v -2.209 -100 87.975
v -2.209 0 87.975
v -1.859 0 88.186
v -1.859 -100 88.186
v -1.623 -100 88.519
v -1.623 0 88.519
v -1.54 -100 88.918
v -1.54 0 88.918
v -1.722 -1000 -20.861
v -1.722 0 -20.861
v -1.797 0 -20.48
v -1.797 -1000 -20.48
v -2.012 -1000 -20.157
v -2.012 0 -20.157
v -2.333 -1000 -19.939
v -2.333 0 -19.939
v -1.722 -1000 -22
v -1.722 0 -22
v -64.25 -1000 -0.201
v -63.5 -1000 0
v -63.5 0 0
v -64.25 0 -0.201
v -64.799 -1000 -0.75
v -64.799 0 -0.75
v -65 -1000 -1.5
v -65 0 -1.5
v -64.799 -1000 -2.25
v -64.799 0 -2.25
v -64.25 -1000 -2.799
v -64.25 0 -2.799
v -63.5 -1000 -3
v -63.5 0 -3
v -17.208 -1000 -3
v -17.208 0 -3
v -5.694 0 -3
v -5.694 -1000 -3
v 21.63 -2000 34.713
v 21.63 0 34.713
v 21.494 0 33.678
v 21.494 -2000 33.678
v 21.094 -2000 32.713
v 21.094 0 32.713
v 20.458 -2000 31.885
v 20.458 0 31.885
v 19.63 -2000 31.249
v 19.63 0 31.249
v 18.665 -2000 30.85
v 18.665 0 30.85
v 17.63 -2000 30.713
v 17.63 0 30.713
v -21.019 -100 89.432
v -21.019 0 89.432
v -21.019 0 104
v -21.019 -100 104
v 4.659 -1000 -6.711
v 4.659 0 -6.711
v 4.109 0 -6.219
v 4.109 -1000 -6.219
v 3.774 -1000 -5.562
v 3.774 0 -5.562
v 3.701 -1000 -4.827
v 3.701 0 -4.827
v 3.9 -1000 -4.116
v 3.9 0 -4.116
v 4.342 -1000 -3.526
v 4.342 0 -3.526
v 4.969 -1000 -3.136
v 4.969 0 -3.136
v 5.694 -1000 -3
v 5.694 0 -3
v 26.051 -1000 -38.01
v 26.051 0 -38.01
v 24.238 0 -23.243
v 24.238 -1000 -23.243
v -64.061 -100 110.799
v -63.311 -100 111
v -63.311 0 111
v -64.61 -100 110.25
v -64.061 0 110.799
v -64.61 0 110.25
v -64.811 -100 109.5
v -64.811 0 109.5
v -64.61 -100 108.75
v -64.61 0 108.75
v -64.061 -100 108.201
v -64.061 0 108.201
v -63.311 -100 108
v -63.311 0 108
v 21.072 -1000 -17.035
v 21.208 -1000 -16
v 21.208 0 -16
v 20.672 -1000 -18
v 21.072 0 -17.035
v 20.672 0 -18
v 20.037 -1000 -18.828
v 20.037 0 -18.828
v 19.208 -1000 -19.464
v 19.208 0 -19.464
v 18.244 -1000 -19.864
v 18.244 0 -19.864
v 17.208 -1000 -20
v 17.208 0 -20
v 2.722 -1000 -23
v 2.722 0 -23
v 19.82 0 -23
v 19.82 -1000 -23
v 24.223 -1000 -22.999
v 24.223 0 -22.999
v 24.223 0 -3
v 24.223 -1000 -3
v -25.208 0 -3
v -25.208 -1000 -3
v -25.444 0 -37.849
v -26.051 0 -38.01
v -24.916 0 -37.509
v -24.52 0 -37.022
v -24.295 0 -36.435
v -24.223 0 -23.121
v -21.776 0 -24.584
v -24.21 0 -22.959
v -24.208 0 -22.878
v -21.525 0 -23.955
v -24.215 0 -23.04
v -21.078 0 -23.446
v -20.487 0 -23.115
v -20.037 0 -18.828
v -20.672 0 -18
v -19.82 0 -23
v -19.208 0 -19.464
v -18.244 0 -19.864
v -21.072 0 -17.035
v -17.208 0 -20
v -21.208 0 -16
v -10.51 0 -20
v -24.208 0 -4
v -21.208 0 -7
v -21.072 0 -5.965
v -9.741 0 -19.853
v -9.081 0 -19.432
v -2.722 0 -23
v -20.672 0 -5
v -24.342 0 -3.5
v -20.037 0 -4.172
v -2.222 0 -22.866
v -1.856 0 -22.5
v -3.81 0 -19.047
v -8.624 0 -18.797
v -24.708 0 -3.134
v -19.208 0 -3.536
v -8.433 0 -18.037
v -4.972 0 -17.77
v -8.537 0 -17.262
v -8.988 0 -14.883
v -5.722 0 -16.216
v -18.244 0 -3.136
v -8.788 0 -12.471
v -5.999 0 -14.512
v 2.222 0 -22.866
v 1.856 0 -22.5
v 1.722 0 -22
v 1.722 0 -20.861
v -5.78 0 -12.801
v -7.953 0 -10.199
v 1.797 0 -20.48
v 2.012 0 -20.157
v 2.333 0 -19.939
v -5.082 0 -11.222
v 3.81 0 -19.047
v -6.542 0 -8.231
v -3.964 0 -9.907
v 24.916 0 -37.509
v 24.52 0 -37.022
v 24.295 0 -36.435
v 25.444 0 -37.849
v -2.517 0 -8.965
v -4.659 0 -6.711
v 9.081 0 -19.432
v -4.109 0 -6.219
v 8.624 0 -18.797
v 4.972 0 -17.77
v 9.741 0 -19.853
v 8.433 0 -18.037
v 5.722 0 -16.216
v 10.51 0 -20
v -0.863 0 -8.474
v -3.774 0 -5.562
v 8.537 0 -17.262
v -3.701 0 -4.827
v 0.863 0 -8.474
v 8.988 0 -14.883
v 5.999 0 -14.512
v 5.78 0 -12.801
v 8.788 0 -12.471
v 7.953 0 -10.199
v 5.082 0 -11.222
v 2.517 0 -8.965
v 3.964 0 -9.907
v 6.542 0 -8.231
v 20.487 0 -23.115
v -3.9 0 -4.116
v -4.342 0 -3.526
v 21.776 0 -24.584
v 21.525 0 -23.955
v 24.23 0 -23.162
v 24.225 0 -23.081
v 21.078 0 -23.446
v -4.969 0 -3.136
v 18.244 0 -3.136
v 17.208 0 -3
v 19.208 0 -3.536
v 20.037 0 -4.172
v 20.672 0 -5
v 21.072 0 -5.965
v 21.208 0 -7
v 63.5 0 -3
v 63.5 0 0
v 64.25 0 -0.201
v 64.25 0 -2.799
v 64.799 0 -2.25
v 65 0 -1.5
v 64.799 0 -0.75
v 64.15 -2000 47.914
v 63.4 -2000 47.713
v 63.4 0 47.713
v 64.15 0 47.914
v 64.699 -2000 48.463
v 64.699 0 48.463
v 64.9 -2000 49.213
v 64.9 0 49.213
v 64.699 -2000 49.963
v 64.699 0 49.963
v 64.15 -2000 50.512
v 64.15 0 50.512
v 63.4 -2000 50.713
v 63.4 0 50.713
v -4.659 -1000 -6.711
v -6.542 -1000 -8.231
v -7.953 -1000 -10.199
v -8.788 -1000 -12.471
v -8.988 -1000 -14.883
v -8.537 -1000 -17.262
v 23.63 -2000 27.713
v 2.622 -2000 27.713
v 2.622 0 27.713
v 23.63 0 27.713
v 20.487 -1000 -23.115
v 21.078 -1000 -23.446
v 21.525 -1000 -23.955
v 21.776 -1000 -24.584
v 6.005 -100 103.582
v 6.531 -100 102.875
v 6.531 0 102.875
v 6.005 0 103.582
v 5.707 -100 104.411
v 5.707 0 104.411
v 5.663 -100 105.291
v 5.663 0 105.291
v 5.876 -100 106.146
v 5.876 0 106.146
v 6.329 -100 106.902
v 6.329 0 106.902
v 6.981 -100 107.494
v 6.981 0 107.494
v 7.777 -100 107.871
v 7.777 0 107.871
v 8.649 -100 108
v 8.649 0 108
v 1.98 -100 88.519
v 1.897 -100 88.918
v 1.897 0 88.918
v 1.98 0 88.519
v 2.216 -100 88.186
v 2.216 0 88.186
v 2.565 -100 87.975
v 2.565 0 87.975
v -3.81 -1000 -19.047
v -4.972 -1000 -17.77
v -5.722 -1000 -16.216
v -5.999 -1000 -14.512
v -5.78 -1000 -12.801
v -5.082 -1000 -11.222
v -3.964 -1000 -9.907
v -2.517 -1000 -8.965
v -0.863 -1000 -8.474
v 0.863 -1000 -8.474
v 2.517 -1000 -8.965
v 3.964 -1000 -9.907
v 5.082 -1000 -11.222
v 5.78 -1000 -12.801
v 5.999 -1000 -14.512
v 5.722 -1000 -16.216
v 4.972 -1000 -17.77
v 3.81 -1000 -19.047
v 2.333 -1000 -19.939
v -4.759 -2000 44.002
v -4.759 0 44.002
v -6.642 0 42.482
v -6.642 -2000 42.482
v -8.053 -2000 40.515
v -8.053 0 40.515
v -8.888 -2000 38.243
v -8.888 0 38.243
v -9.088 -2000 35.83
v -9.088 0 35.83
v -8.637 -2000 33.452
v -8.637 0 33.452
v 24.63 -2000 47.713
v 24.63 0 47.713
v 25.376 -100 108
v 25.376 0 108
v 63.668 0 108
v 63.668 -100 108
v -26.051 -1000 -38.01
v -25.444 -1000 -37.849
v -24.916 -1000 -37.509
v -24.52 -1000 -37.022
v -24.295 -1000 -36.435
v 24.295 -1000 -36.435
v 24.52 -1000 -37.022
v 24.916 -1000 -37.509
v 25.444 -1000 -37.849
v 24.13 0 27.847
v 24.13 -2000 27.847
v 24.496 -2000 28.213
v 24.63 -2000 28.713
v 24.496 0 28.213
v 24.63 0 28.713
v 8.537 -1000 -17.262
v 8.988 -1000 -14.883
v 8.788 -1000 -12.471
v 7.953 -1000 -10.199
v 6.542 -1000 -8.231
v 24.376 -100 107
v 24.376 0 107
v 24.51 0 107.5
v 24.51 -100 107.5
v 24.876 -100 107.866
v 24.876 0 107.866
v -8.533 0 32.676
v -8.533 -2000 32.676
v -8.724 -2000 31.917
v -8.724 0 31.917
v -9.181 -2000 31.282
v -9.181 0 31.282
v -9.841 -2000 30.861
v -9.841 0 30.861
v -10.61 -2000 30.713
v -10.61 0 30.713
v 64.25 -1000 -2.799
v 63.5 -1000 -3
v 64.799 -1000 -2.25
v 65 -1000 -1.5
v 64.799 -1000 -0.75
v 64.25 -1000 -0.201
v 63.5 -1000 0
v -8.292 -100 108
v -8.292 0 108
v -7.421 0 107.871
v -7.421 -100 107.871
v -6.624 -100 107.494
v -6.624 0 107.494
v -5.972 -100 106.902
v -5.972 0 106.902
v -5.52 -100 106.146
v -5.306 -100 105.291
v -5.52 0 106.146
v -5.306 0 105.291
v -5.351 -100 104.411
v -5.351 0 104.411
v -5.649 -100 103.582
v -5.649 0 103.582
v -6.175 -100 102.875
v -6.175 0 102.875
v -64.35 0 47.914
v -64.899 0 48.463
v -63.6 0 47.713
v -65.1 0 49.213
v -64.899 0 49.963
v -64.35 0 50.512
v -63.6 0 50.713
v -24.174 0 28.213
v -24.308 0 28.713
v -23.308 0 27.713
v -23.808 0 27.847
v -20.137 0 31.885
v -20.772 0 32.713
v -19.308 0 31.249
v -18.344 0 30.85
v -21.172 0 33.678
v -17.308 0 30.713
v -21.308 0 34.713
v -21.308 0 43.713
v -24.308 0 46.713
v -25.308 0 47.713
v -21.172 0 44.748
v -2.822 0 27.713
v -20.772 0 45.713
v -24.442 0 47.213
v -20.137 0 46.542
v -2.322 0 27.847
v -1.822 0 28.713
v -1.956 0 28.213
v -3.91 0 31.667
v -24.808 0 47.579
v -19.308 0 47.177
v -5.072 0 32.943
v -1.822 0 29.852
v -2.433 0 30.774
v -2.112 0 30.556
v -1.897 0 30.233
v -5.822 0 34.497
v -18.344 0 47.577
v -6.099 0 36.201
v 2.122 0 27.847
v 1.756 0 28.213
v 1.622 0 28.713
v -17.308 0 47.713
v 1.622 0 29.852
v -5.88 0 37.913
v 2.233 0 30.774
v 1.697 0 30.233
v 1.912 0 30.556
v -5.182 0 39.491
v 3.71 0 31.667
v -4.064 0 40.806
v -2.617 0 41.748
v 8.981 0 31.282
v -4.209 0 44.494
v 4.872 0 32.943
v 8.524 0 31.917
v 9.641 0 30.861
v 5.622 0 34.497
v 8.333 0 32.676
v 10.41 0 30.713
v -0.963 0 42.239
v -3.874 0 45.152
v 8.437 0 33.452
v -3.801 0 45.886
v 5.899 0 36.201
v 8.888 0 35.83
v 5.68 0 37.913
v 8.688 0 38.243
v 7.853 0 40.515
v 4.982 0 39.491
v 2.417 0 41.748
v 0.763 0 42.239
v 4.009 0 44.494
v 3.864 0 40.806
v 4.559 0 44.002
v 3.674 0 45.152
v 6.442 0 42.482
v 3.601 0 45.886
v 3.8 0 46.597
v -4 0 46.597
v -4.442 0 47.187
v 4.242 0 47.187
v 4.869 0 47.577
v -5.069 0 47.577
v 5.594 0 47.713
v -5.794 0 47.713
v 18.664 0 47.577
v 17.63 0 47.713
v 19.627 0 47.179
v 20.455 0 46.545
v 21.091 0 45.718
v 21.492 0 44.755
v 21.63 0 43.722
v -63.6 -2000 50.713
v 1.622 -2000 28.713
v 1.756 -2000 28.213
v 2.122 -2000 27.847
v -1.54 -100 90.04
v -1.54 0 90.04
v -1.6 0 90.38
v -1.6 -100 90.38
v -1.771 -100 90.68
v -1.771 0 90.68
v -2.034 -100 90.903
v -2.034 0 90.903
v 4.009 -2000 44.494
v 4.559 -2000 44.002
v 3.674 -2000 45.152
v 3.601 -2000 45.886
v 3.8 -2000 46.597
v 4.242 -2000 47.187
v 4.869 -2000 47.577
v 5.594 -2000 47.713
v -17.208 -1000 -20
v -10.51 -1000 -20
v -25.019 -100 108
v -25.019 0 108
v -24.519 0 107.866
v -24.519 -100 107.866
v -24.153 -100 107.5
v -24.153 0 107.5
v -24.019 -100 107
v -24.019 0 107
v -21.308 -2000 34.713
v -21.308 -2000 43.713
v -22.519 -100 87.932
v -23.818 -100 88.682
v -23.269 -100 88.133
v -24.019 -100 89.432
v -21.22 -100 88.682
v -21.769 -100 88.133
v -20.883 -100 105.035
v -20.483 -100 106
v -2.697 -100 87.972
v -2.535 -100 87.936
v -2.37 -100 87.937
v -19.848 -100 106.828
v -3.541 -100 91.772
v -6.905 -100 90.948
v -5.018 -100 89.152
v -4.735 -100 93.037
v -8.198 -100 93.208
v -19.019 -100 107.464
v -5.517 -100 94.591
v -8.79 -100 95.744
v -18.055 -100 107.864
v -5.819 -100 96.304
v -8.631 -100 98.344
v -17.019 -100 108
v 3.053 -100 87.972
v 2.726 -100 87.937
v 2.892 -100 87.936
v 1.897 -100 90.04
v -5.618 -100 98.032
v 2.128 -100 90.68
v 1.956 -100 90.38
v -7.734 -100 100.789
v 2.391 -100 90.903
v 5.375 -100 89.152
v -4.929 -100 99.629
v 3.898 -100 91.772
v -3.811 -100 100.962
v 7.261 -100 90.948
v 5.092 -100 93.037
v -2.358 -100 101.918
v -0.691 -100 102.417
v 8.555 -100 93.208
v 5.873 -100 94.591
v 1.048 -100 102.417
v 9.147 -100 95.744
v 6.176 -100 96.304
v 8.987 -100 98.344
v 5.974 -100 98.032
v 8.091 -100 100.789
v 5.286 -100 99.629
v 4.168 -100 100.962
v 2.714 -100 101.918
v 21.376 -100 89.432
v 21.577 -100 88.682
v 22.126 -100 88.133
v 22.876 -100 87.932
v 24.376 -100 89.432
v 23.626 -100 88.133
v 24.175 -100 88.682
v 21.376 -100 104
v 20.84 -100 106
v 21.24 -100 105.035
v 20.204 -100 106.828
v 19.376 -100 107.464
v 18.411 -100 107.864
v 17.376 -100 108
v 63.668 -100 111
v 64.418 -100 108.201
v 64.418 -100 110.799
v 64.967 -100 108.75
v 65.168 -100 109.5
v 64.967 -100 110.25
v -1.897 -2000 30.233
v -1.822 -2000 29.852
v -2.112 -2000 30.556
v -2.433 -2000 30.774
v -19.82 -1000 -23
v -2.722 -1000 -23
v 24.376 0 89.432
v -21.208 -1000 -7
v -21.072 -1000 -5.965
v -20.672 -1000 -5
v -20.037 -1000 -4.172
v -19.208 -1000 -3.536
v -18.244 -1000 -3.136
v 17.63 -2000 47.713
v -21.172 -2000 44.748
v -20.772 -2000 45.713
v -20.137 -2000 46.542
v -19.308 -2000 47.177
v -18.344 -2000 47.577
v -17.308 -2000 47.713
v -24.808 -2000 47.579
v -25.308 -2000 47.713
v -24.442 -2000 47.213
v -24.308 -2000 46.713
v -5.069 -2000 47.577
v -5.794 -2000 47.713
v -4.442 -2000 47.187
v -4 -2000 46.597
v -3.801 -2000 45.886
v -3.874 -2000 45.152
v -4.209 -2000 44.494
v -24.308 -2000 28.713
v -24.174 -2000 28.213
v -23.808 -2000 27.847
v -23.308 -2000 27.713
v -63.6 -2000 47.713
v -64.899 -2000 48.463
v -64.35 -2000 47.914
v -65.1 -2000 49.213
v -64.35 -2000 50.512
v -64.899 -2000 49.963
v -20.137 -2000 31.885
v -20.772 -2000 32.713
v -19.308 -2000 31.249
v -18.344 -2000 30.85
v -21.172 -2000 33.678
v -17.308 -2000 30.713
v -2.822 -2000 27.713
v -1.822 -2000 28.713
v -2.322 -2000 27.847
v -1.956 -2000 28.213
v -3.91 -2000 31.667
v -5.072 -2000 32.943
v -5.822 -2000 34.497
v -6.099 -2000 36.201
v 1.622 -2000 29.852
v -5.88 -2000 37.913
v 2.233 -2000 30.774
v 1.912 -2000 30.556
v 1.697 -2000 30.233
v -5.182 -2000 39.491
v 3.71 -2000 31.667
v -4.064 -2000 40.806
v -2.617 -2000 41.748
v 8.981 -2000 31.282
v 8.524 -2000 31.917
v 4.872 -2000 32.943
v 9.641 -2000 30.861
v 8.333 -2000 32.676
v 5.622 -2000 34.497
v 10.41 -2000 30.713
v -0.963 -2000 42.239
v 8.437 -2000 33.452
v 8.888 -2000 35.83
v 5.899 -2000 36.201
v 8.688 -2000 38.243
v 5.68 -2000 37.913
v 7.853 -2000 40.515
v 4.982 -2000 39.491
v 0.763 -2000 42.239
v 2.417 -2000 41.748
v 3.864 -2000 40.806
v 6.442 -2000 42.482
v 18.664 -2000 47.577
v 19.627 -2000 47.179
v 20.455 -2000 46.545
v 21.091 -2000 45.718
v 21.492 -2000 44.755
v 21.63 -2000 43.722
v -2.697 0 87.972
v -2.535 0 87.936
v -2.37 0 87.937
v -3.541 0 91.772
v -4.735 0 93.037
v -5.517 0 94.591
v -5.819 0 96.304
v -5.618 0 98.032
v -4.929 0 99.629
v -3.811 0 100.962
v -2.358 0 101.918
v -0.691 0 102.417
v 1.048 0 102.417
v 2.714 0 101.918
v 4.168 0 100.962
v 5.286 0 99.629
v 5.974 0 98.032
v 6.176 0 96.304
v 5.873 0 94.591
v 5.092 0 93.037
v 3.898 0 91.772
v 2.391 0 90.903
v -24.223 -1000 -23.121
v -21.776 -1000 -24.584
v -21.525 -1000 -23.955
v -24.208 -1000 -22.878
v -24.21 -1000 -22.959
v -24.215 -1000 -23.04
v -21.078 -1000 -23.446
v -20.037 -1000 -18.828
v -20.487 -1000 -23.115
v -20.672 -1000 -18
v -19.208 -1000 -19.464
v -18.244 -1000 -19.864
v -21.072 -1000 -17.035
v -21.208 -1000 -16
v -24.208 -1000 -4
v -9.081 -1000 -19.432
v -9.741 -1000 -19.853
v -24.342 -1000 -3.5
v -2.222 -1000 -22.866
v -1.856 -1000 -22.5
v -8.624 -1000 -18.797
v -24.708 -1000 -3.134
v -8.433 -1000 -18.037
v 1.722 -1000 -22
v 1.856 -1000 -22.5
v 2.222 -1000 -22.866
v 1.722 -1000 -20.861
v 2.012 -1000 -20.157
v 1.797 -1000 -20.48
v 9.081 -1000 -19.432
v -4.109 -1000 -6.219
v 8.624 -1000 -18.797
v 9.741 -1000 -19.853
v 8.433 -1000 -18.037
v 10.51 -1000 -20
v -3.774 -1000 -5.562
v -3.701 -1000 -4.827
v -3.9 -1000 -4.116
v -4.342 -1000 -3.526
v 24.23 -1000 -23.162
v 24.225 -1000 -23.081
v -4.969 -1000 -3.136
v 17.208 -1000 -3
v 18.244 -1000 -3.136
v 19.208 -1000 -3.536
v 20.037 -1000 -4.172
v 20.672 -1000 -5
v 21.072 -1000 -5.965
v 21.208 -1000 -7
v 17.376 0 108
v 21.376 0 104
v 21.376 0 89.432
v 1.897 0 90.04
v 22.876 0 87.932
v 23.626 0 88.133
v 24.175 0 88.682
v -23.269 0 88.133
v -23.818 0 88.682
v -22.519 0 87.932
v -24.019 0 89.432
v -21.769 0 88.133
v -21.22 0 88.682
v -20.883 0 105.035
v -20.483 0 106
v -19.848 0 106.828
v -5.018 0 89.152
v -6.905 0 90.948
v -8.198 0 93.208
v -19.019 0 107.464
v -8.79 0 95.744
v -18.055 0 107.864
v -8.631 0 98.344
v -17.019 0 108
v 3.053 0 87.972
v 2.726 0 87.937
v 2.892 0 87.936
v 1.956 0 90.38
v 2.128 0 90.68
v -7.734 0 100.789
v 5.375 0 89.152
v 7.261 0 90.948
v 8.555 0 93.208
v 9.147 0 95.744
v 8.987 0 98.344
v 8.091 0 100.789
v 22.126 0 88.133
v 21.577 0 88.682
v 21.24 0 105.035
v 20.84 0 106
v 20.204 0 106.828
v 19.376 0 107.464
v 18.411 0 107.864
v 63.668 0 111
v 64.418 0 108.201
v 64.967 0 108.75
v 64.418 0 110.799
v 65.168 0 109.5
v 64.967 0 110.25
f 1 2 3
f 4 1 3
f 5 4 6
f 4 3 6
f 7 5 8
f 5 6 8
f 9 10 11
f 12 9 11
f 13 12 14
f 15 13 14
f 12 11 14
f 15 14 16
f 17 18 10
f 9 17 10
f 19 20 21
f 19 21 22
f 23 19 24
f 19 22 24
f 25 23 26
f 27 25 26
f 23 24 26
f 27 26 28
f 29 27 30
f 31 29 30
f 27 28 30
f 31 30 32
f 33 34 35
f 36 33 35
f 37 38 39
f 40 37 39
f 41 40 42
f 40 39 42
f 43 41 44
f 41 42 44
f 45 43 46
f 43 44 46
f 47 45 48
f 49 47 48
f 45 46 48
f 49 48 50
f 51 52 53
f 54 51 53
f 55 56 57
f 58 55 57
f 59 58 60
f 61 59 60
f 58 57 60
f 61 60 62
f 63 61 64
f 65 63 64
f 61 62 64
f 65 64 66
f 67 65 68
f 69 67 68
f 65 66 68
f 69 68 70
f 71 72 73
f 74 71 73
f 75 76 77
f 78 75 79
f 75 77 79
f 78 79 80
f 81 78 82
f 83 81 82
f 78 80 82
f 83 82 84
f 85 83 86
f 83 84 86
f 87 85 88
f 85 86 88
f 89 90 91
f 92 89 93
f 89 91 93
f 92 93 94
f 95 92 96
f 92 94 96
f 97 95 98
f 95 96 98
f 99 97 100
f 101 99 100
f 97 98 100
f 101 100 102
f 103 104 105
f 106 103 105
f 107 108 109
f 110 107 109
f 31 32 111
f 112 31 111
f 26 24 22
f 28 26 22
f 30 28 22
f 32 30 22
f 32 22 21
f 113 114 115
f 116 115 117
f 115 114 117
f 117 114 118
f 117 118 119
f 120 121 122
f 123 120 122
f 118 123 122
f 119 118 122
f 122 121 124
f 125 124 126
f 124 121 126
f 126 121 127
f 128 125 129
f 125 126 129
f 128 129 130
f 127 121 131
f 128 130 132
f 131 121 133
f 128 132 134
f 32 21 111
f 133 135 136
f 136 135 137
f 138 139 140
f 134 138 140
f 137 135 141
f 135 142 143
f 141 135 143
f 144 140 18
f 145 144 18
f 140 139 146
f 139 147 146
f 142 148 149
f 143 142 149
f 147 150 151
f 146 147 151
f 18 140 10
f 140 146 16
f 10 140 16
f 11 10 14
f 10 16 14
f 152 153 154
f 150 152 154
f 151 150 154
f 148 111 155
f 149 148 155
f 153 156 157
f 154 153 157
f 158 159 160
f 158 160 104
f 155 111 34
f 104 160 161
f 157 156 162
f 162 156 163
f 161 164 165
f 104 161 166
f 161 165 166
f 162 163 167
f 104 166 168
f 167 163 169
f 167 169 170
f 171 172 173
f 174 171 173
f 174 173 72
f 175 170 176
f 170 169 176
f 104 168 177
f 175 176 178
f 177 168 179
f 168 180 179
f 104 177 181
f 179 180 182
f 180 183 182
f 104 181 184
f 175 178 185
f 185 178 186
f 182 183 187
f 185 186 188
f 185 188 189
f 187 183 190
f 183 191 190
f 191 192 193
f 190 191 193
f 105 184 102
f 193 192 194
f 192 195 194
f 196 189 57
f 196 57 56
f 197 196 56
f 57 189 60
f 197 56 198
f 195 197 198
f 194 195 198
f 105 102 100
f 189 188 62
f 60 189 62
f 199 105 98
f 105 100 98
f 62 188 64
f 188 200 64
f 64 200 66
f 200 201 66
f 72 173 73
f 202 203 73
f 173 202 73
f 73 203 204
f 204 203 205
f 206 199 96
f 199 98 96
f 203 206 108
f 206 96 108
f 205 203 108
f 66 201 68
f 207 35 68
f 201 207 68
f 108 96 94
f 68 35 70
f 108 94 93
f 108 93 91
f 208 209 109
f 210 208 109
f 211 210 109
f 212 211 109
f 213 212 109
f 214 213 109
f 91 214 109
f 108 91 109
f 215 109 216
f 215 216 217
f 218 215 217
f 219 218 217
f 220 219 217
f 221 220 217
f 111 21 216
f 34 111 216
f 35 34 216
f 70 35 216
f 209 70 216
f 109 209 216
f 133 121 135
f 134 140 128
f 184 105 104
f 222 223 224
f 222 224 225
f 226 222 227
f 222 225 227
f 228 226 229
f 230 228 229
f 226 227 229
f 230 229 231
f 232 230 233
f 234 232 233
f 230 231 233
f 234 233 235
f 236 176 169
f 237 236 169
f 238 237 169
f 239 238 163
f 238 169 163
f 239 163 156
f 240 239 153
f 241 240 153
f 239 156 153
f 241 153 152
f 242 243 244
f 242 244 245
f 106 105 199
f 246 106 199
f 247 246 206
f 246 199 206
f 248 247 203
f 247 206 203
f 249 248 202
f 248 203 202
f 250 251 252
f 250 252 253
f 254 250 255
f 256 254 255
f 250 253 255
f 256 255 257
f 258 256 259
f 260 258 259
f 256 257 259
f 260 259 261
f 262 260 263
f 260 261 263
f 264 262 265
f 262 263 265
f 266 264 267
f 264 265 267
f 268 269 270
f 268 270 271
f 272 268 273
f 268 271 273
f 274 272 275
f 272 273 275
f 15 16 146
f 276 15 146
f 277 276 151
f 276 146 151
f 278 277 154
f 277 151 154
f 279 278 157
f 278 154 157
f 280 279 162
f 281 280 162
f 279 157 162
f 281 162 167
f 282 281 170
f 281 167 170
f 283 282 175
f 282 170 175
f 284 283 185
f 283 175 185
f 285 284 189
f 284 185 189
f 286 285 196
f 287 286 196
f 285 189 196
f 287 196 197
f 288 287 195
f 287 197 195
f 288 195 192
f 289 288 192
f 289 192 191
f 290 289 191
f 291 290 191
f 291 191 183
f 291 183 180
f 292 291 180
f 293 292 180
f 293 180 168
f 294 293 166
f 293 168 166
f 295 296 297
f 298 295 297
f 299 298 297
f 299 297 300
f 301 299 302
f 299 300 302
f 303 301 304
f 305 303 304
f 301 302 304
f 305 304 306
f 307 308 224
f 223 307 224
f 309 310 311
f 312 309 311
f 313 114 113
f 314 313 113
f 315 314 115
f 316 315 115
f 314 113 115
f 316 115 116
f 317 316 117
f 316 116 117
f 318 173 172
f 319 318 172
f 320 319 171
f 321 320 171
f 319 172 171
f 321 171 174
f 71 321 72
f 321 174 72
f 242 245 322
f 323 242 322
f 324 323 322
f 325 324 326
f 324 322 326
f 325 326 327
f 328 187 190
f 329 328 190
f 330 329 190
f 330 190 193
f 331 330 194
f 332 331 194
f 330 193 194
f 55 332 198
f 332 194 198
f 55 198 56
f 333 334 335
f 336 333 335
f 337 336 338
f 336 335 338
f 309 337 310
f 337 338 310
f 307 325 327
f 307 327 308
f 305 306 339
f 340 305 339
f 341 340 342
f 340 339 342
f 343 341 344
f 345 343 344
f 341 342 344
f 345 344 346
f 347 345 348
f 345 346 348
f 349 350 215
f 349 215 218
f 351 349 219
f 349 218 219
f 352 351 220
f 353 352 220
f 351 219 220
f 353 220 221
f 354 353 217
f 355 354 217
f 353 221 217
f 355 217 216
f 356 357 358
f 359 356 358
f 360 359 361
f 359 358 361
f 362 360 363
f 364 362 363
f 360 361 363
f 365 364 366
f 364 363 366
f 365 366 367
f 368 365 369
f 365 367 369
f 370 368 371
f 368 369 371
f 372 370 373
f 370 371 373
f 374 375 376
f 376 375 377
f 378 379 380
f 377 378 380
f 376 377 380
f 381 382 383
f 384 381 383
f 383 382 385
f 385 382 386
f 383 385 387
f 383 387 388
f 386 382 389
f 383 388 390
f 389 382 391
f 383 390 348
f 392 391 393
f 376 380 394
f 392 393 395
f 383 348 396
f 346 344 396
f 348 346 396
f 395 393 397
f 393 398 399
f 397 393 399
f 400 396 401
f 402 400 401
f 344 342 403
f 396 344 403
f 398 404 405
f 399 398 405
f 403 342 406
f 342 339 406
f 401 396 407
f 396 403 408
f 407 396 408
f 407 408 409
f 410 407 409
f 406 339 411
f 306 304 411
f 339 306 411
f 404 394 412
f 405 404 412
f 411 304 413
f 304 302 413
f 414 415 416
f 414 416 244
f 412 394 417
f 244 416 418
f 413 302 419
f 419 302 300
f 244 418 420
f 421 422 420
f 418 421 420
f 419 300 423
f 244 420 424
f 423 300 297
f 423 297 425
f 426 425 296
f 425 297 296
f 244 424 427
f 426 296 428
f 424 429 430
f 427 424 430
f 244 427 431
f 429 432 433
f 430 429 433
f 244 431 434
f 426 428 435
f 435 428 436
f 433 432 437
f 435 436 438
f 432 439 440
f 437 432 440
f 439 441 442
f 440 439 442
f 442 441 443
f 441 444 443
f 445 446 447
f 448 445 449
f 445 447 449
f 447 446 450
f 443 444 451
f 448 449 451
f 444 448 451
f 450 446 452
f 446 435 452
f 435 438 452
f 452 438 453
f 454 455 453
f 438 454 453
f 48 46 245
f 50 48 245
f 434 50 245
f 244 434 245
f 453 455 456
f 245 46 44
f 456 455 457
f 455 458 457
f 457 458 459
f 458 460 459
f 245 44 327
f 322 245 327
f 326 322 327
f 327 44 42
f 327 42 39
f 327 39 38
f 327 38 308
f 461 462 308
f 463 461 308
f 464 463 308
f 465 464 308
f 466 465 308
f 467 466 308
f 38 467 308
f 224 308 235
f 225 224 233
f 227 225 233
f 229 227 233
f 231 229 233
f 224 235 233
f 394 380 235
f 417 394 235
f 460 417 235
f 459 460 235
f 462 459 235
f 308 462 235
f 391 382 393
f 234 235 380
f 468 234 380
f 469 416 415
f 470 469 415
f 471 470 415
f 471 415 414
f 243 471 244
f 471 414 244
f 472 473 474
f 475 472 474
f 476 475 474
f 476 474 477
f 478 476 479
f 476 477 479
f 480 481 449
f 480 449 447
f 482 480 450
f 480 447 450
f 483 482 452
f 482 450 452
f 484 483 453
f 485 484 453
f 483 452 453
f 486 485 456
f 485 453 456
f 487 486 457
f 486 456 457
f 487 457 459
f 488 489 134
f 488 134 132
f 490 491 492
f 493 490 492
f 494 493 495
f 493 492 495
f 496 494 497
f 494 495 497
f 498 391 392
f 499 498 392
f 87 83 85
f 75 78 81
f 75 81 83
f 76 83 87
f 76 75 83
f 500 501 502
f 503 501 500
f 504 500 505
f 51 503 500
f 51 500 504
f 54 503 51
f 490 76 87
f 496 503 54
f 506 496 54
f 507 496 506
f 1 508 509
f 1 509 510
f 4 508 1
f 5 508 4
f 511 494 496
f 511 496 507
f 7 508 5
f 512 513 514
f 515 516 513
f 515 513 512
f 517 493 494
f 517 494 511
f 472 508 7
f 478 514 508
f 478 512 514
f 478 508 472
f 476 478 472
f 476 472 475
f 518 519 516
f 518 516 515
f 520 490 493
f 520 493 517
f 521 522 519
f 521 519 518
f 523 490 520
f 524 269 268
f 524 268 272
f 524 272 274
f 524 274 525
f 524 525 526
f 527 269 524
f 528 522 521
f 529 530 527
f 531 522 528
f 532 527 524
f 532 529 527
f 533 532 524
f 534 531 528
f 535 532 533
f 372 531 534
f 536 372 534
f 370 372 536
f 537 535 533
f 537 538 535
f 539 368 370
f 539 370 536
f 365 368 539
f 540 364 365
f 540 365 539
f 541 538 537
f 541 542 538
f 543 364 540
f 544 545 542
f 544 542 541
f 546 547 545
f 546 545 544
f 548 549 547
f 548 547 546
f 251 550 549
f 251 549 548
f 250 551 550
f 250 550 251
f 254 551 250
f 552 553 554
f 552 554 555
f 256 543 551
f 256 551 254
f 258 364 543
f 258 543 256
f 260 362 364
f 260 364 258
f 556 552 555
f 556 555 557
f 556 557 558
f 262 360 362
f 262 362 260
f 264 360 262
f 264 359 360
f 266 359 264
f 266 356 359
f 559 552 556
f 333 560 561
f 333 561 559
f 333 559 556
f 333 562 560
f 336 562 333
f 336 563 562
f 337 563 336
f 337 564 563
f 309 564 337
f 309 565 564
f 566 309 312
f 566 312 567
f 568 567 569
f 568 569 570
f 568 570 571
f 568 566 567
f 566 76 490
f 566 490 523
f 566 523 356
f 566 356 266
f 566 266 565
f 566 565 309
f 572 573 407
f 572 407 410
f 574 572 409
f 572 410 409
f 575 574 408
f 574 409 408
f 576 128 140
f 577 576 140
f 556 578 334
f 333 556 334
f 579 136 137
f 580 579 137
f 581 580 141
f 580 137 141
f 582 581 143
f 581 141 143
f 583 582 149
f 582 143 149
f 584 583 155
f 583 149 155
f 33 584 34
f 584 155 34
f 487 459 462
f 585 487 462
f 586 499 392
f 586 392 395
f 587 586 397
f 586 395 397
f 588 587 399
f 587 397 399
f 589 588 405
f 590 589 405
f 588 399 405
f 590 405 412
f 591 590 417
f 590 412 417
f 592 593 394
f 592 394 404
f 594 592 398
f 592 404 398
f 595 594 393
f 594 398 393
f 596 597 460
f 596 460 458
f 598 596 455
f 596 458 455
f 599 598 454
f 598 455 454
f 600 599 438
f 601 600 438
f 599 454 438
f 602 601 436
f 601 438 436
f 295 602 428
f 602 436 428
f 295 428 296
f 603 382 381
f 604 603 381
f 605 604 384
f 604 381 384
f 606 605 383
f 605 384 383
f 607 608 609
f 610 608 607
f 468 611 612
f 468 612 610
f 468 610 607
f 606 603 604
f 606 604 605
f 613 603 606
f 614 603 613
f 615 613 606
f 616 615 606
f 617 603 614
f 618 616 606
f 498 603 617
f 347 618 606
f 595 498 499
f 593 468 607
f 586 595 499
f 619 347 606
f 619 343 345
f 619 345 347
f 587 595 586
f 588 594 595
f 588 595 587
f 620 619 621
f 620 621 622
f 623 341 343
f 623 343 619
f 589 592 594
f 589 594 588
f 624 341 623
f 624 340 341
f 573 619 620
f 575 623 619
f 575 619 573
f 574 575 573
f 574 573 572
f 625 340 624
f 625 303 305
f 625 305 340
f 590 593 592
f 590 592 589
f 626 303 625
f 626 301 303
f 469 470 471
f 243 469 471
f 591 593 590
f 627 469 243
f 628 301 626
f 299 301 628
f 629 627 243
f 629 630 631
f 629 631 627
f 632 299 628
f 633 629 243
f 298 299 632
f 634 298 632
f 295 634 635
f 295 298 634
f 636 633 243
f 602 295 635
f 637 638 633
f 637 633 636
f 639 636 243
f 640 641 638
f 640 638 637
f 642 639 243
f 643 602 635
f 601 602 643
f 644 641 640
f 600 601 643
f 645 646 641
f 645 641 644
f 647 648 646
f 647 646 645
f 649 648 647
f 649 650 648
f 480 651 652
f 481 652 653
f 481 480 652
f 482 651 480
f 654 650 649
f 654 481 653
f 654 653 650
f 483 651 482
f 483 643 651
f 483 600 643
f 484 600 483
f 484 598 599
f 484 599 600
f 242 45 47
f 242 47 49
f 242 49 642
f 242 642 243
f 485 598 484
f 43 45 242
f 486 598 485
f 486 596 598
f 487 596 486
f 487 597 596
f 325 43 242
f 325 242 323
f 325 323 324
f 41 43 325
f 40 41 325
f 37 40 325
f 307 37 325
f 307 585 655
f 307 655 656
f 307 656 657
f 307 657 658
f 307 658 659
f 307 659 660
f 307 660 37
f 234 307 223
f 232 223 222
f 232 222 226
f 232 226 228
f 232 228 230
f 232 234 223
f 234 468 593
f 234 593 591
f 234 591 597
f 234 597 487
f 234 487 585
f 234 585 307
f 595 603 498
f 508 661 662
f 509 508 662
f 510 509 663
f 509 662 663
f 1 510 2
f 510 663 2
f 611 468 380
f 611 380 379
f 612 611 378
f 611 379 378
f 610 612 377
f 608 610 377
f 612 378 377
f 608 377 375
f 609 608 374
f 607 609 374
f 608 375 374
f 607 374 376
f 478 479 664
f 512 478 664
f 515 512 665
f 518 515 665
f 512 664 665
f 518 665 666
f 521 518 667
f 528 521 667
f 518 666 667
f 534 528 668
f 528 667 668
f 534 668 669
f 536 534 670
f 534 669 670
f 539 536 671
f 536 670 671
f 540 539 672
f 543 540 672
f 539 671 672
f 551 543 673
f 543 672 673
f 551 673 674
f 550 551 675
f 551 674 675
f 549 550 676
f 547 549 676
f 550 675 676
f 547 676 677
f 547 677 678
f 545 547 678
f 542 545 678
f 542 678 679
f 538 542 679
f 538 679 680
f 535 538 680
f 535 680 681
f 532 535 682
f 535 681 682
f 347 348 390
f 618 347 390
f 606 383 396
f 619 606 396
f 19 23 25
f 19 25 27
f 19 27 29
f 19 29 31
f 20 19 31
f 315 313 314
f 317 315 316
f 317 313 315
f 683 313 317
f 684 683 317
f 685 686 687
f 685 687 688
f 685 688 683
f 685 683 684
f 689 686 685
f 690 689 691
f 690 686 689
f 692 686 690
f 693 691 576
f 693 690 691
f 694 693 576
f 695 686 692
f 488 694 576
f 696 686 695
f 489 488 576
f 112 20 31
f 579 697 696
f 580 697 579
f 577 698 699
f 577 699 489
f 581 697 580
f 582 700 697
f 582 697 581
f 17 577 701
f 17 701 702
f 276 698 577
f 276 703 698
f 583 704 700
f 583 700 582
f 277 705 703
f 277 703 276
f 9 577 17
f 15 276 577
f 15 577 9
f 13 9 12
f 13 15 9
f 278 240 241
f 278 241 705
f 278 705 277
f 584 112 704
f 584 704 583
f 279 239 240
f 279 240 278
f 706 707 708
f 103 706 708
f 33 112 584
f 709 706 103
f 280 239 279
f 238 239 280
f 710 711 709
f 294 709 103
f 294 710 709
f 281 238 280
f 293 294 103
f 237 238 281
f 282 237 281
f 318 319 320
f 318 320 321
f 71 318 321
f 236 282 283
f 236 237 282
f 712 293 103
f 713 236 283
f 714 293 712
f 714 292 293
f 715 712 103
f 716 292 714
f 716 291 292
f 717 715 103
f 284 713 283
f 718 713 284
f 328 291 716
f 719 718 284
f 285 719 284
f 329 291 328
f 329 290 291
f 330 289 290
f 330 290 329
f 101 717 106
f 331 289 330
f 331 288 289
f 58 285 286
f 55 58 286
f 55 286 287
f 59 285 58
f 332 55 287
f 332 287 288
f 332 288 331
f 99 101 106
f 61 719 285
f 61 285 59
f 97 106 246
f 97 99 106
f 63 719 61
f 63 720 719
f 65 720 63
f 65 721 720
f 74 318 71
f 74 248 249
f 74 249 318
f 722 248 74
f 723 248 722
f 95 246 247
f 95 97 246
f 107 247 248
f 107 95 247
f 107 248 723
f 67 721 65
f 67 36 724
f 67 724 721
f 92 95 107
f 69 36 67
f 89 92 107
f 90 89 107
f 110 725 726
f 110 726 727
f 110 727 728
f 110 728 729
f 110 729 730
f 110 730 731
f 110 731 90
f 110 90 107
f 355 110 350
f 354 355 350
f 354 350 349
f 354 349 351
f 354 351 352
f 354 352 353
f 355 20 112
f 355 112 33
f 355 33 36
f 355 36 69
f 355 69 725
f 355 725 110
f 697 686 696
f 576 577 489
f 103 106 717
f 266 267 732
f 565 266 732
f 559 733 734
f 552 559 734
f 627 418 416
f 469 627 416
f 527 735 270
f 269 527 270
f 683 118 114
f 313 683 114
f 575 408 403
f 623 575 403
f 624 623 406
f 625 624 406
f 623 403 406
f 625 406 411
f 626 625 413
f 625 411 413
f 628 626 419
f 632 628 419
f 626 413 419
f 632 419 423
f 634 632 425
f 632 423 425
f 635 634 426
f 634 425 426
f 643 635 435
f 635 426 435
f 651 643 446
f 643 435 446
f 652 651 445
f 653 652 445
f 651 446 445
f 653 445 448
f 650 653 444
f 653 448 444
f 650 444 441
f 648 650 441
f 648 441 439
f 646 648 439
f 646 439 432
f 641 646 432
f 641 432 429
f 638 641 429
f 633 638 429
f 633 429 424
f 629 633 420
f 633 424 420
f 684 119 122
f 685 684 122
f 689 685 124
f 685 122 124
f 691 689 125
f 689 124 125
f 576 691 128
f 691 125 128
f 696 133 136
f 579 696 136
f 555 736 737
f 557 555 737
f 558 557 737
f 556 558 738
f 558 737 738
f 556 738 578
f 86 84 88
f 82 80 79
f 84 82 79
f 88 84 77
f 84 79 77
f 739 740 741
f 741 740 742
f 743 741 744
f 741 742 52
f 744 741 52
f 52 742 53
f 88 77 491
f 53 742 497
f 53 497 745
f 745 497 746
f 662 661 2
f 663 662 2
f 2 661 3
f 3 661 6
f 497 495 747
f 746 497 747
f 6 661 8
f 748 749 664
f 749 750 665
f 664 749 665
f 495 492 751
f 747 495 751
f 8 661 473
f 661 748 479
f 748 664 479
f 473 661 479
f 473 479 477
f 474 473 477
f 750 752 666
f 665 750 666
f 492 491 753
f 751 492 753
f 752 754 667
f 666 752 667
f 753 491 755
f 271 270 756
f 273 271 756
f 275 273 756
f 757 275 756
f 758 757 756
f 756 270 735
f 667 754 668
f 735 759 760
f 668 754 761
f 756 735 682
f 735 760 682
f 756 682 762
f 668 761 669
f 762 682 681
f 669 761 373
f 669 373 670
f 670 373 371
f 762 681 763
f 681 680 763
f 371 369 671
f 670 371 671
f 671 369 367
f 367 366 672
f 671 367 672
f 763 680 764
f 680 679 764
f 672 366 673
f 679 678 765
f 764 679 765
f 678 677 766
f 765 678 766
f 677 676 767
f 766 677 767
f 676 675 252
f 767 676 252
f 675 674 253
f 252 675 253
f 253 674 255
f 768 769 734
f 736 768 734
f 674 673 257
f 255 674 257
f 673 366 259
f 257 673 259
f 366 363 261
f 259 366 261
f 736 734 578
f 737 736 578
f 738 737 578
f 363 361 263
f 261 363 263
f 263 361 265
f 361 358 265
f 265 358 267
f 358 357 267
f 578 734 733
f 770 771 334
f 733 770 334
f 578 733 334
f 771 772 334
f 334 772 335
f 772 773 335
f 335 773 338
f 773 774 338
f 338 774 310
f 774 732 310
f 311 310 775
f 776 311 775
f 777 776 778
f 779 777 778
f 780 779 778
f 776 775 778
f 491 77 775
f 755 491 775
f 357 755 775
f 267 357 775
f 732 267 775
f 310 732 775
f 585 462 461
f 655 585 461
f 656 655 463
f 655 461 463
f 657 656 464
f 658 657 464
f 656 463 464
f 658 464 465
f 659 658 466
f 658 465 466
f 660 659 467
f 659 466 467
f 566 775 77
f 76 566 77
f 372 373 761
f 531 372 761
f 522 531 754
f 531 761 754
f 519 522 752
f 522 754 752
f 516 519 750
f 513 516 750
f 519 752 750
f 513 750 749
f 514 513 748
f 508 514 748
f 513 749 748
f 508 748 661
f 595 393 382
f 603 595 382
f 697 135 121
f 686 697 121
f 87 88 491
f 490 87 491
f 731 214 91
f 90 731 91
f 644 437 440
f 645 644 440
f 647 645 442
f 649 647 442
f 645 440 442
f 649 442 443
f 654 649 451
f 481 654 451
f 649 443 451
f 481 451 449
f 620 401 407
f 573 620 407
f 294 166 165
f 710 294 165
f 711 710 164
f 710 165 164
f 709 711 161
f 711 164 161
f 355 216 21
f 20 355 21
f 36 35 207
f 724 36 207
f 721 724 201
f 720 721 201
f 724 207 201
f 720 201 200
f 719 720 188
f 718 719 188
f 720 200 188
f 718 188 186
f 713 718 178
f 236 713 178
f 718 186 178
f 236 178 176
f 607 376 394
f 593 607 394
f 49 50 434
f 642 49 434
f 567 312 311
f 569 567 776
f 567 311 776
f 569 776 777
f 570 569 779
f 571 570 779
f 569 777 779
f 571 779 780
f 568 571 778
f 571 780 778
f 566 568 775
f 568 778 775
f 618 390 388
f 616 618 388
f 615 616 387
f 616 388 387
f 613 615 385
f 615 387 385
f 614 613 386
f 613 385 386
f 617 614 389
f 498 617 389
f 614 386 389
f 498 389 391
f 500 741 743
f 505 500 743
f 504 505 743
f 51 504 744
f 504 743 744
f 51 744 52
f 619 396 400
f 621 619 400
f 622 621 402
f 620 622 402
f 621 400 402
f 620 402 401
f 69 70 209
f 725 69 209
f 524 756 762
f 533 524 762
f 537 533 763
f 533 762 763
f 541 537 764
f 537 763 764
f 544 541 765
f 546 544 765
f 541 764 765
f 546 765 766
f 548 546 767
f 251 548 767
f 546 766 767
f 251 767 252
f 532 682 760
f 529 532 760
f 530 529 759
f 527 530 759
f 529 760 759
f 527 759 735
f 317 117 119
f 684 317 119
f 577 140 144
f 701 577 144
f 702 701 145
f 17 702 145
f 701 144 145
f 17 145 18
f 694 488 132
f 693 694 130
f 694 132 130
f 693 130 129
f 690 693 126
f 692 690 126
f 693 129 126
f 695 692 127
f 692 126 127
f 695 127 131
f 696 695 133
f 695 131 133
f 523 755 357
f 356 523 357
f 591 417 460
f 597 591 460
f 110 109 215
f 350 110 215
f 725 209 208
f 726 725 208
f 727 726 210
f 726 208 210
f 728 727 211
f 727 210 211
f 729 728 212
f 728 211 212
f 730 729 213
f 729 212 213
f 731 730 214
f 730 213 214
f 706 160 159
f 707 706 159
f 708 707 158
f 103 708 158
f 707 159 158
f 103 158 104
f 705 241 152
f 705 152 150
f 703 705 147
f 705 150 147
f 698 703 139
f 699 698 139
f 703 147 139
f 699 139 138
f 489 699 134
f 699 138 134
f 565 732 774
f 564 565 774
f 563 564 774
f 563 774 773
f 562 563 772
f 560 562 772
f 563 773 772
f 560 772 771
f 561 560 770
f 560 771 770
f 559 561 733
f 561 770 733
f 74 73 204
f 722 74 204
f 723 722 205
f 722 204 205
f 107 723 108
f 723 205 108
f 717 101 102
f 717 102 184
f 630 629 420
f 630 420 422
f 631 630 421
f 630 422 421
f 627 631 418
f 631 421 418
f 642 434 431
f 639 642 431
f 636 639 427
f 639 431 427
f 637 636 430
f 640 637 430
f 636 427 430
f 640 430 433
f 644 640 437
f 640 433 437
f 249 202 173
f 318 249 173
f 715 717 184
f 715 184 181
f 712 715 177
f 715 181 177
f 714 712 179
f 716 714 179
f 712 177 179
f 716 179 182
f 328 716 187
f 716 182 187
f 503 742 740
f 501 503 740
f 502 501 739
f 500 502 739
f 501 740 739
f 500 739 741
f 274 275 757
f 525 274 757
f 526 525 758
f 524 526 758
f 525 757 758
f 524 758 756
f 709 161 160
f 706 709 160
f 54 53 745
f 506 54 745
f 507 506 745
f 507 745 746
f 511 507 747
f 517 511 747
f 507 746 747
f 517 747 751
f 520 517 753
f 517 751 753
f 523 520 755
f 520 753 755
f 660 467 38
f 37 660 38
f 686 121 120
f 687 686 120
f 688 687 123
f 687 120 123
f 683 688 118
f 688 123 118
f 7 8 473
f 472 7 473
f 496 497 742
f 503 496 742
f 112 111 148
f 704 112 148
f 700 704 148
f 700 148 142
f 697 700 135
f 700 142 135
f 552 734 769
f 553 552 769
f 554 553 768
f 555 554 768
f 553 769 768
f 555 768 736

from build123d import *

# Parameters (mm, degrees)
F1_DEPTH = 1000
F2_DEPTH = 2000
F3_DEPTH = 100


# Not quite as in the source:
# - ends of sketch curves that miss each other by under 0.0002 mm in the source are joined


with BuildPart() as f1:
    # F0 (on Front) → F1 (new body)
    with BuildSketch(Plane.XZ):
        with BuildLine():
            Line((63.5, 0), (-63.5, 0))
            ThreePointArc((-63.5, 0), (-65, -1.5), (-63.5, -3))
            Line((-63.5, -3), (-25.2083473523, -3))
            ThreePointArc((-25.2083473523, -3), (-24.5012405711, -3.2928932188), (-24.2083473523, -4))
            Line((-24.2083473523, -4), (-24.2083473523, -22.8776747597))
            ThreePointArc((-24.2083473523, -22.8776747597), (-24.2120777554, -22.9997718388), (-24.223255049, -23.1214134465))
            Line((-24.223255049, -23.1214134465), (-26.0512952001, -38.0096057211))
            ThreePointArc((-26.0512952001, -38.0096057211), (-24.9164089173, -37.5089670967), (-24.2949814984, -36.4354523693))
            Line((-24.2949814984, -36.4354523693), (-21.7759150734, -24.5841766184))
            ThreePointArc((-21.7759150734, -24.5841766184), (-21.0782606541, -23.4457080771), (-19.819619872, -23))
            Line((-19.819619872, -23), (-2.7222222222, -23))
            ThreePointArc((-2.7222222222, -23), (-2.015115441, -22.7071067812), (-1.7222222222, -22))
            Line((-1.7222222222, -22), (-1.7222222222, -20.8607207227))
            ThreePointArc((-1.7222222222, -20.8607207227), (-1.8888888889, -20.3079499243), (-2.3333333333, -19.9394360587))
            ThreePointArc((-2.3333333333, -19.9394360587), (0, -8.4117280748), (2.3333333333, -19.9394360587))
            ThreePointArc((2.3333333333, -19.9394360587), (1.8888888889, -20.3079499243), (1.7222222222, -20.8607207227))
            Line((1.7222222222, -20.8607207227), (1.7222222222, -22))
            ThreePointArc((1.7222222222, -22), (2.015115441, -22.7071067812), (2.7222222222, -23))
            Line((2.7222222222, -23), (19.819619872, -23))
            ThreePointArc((19.819619872, -23), (21.0782606541, -23.4457080771), (21.7759150734, -24.5841766184))
            Line((21.7759150734, -24.5841766184), (24.2949814984, -36.4354523693))
            ThreePointArc((24.2949814984, -36.4354523693), (24.9164089173, -37.5089670967), (26.0512952001, -38.0096057211))
            Line((26.0512952001, -38.0096057211), (24.2381627457, -23.242826893))
            ThreePointArc((24.2381627457, -23.242826893), (24.2269854521, -23.1211852853), (24.223255049, -22.9990882062))
            Line((24.223255049, -22.9990882062), (24.223255049, -3))
            Line((24.223255049, -3), (63.5, -3))
            ThreePointArc((63.5, -3), (65, -1.5), (63.5, 0))
        make_face()
        with BuildLine():
            Line((-21.2083473523, -16), (-21.2083473523, -7))
            ThreePointArc((-21.2083473523, -7), (-20.036774477, -4.1715728753), (-17.2083473523, -3))
            Line((-17.2083473523, -3), (-5.6938014232, -3))
            ThreePointArc((-5.6938014232, -3), (-3.7673478716, -4.4626205124), (-4.6585648008, -6.7112232863))
            ThreePointArc((-4.6585648008, -6.7112232863), (-8.4473321852, -11.3064778509), (-8.5368852816, -17.2615683665))
            ThreePointArc((-8.5368852816, -17.2615683665), (-8.8221800029, -19.1358853065), (-10.5097115925, -20))
            Line((-10.5097115925, -20), (-17.2083473523, -20))
            ThreePointArc((-17.2083473523, -20), (-20.036774477, -18.8284271247), (-21.2083473523, -16))
        make_face(mode=Mode.SUBTRACT)
        with BuildLine():
            Line((21.2083473523, -7), (21.2083473523, -7.008646884))
            Line((21.2083473523, -7.008646884), (21.2083473523, -16))
            ThreePointArc((21.2083473523, -16), (20.036774477, -18.8284271247), (17.2083473523, -20))
            Line((17.2083473523, -20), (10.5097115925, -20))
            ThreePointArc((10.5097115925, -20), (8.8221800029, -19.1358853065), (8.5368852816, -17.2615683665))
            ThreePointArc((8.5368852816, -17.2615683665), (8.4473321852, -11.3064778509), (4.6585648008, -6.7112232863))
            ThreePointArc((4.6585648008, -6.7112232863), (3.7673478716, -4.4626205124), (5.6938014232, -3))
            Line((5.6938014232, -3), (17.2083473523, -3))
            ThreePointArc((17.2083473523, -3), (20.036774477, -4.1715728753), (21.2083473523, -7))
        make_face(mode=Mode.SUBTRACT)
    extrude(amount=F1_DEPTH)


with BuildPart() as f2:
    # F0 (on Front) → F2 (new body)
    with BuildSketch(Plane.XZ):
        with BuildLine():
            Line((63.4000037313, 50.7132201195), (-63.5999962687, 50.7132201195))
            ThreePointArc((-63.5999962687, 50.7132201195), (-65.0999962687, 49.2132201195), (-63.5999962687, 47.7132201195))
            Line((-63.5999962687, 47.7132201195), (-25.308343621, 47.7132201195))
            ThreePointArc((-25.308343621, 47.7132201195), (-24.6012368398, 47.4203269007), (-24.308343621, 46.7132201195))
            Line((-24.308343621, 46.7132201195), (-24.308343621, 28.7132201195))
            ThreePointArc((-24.308343621, 28.7132201195), (-24.0154504022, 28.0061133383), (-23.308343621, 27.7132201195))
            Line((-23.308343621, 27.7132201195), (-19.9187639256, 27.7132201195))
            Line((-19.9187639256, 27.7132201195), (-2.822218491, 27.7132201195))
            ThreePointArc((-2.822218491, 27.7132201195), (-2.1151117098, 28.0061133383), (-1.822218491, 28.7132201195))
            Line((-1.822218491, 28.7132201195), (-1.822218491, 29.8524993968))
            ThreePointArc((-1.822218491, 29.8524993968), (-1.9888851576, 30.4052701952), (-2.4333296021, 30.7737840608))
            ThreePointArc((-2.4333296021, 30.7737840608), (-0.0999962687, 42.3014920447), (2.2333370646, 30.7737840608))
            ThreePointArc((2.2333370646, 30.7737840608), (1.7888926201, 30.4052701952), (1.6222259535, 29.8524993968))
            Line((1.6222259535, 29.8524993968), (1.6222259535, 28.7132201195))
            ThreePointArc((1.6222259535, 28.7132201195), (1.9151191723, 28.0061133383), (2.6222259535, 27.7132201195))
            Line((2.6222259535, 27.7132201195), (19.7196236032, 27.7132201195))
            Line((19.7196236032, 27.7132201195), (23.629926187, 27.7132201195))
            ThreePointArc((23.629926187, 27.7132201195), (24.3370329682, 28.0061133383), (24.629926187, 28.7132201195))
            Line((24.629926187, 28.7132201195), (24.629926187, 47.7132201195))
            Line((24.629926187, 47.7132201195), (63.4000037313, 47.7132201195))
            ThreePointArc((63.4000037313, 47.7132201195), (64.9000037313, 49.2132201195), (63.4000037313, 50.7132201195))
        make_face()
        with BuildLine():
            Line((-21.308343621, 34.7132201195), (-21.308343621, 43.7132201195))
            ThreePointArc((-21.308343621, 43.7132201195), (-20.1367707458, 46.5416472442), (-17.308343621, 47.7132201195))
            Line((-17.308343621, 47.7132201195), (-5.7937976919, 47.7132201195))
            ThreePointArc((-5.7937976919, 47.7132201195), (-3.8673441404, 46.2505996071), (-4.7585610695, 44.0019968332))
            ThreePointArc((-4.7585610695, 44.0019968332), (-8.5473284539, 39.4067422686), (-8.6368815504, 33.451651753))
            ThreePointArc((-8.6368815504, 33.451651753), (-8.9221762716, 31.577334813), (-10.6097078613, 30.7132201195))
            Line((-10.6097078613, 30.7132201195), (-17.308343621, 30.7132201195))
            ThreePointArc((-17.308343621, 30.7132201195), (-20.1367707458, 31.8847929947), (-21.308343621, 34.7132201195))
        make_face(mode=Mode.SUBTRACT)
        with BuildLine():
            Line((21.629926187, 43.7218670034), (21.629926187, 43.7132201195))
            Line((21.629926187, 43.7132201195), (21.629926187, 34.7132201195))
            ThreePointArc((21.629926187, 34.7132201195), (20.4583533118, 31.8847929947), (17.629926187, 30.7132201195))
            Line((17.629926187, 30.7132201195), (17.1083510835, 30.7132201195))
            Line((17.1083510835, 30.7132201195), (10.4097153238, 30.7132201195))
            ThreePointArc((10.4097153238, 30.7132201195), (8.7221837341, 31.577334813), (8.4368890129, 33.451651753))
            ThreePointArc((8.4368890129, 33.451651753), (8.3473359164, 39.4067422686), (4.558568532, 44.0019968332))
            ThreePointArc((4.558568532, 44.0019968332), (3.6673516029, 46.2505996071), (5.5938051544, 47.7132201195))
            Line((5.5938051544, 47.7132201195), (6.115380258, 47.7132201195))
            Line((6.115380258, 47.7132201195), (17.629926187, 47.7132201195))
            ThreePointArc((17.629926187, 47.7132201195), (20.4552945298, 46.5447027218), (21.629926187, 43.7218670034))
        make_face(mode=Mode.SUBTRACT)
    extrude(amount=F2_DEPTH)


with BuildPart() as f3:
    # F0 (on Front) → F3 (new body)
    with BuildSketch(Plane.XZ):
        with BuildLine():
            Line((63.6676191584, 111.000010252), (-63.3110105991, 111.000010252))
            ThreePointArc((-63.3110105991, 111.000010252), (-64.8110105991, 109.500010252), (-63.3110105991, 108.000010252))
            Line((-63.3110105991, 108.000010252), (-25.0193579514, 108.000010252))
            ThreePointArc((-25.0193579514, 108.000010252), (-24.3122511702, 107.7071170332), (-24.0193579514, 107.000010252))
            Line((-24.0193579514, 107.000010252), (-24.0193579514, 89.4322879863))
            ThreePointArc((-24.0193579514, 89.4322879863), (-23.5800181232, 88.3716278145), (-22.5193579514, 87.9322879863))
            ThreePointArc((-22.5193579514, 87.9322879863), (-21.4586977796, 88.3716278145), (-21.0193579514, 89.4322879863))
            Line((-21.0193579514, 89.4322879863), (-21.0193579514, 104.000010252))
            ThreePointArc((-21.0193579514, 104.000010252), (-19.8477850761, 106.8284373767), (-17.0193579514, 108.000010252))
            Line((-17.0193579514, 108.000010252), (-8.2922328934, 108.000010252))
            ThreePointArc((-8.2922328934, 108.000010252), (-5.5195987668, 106.1456541757), (-6.1745986001, 102.875010252))
            ThreePointArc((-6.1745986001, 102.875010252), (-8.5862177235, 94.4547342177), (-2.6967573079, 87.9715859621))
            ThreePointArc((-2.6967573079, 87.9715859621), (-2.4524791129, 87.9323026488), (-2.2087112857, 87.9746377601))
            ThreePointArc((-2.2087112857, 87.9746377601), (-1.7241213898, 88.3399312814), (-1.5399880278, 88.918171395))
            Line((-1.5399880278, 88.918171395), (-1.5399880278, 90.0404468849))
            ThreePointArc((-1.5399880278, 90.0404468849), (-1.6723445466, 90.5376337608), (-2.0343776068, 90.9032087885))
            ThreePointArc((-2.0343776068, 90.9032087885), (0.1783042796, 102.4803082917), (2.3909861661, 90.9032087885))
            ThreePointArc((2.3909861661, 90.9032087885), (2.0289531059, 90.5376337608), (1.8965965871, 90.0404468849))
            Line((1.8965965871, 90.0404468849), (1.8965965871, 88.918171395))
            ThreePointArc((1.8965965871, 88.918171395), (2.080729949, 88.3399312814), (2.565319845, 87.9746377601))
            ThreePointArc((2.565319845, 87.9746377601), (2.8090876722, 87.9323026488), (3.0533658672, 87.9715859621))
            ThreePointArc((3.0533658672, 87.9715859621), (8.9428262828, 94.4547342177), (6.5312071594, 102.875010252))
            ThreePointArc((6.5312071594, 102.875010252), (5.8762073261, 106.1456541757), (8.6488414527, 108.000010252))
            Line((8.6488414527, 108.000010252), (17.3759665107, 108.000010252))
            ThreePointArc((17.3759665107, 108.000010252), (20.2043936354, 106.8284373767), (21.3759665107, 104.000010252))
            Line((21.3759665107, 104.000010252), (21.3759665107, 89.4322879863))
            ThreePointArc((21.3759665107, 89.4322879863), (21.8153063389, 88.3716278145), (22.8759665107, 87.9322879863))
            ThreePointArc((22.8759665107, 87.9322879863), (23.9366266825, 88.3716278145), (24.3759665107, 89.4322879863))
            Line((24.3759665107, 89.4322879863), (24.3759665107, 107.000010252))
            ThreePointArc((24.3759665107, 107.000010252), (24.6688597295, 107.7071170332), (25.3759665107, 108.000010252))
            Line((25.3759665107, 108.000010252), (63.6676191584, 108.000010252))
            ThreePointArc((63.6676191584, 108.000010252), (65.1676191584, 109.500010252), (63.6676191584, 111.000010252))
        make_face()
    extrude(amount=F3_DEPTH)


solid = Compound([f1.part, f2.part, f3.part])
